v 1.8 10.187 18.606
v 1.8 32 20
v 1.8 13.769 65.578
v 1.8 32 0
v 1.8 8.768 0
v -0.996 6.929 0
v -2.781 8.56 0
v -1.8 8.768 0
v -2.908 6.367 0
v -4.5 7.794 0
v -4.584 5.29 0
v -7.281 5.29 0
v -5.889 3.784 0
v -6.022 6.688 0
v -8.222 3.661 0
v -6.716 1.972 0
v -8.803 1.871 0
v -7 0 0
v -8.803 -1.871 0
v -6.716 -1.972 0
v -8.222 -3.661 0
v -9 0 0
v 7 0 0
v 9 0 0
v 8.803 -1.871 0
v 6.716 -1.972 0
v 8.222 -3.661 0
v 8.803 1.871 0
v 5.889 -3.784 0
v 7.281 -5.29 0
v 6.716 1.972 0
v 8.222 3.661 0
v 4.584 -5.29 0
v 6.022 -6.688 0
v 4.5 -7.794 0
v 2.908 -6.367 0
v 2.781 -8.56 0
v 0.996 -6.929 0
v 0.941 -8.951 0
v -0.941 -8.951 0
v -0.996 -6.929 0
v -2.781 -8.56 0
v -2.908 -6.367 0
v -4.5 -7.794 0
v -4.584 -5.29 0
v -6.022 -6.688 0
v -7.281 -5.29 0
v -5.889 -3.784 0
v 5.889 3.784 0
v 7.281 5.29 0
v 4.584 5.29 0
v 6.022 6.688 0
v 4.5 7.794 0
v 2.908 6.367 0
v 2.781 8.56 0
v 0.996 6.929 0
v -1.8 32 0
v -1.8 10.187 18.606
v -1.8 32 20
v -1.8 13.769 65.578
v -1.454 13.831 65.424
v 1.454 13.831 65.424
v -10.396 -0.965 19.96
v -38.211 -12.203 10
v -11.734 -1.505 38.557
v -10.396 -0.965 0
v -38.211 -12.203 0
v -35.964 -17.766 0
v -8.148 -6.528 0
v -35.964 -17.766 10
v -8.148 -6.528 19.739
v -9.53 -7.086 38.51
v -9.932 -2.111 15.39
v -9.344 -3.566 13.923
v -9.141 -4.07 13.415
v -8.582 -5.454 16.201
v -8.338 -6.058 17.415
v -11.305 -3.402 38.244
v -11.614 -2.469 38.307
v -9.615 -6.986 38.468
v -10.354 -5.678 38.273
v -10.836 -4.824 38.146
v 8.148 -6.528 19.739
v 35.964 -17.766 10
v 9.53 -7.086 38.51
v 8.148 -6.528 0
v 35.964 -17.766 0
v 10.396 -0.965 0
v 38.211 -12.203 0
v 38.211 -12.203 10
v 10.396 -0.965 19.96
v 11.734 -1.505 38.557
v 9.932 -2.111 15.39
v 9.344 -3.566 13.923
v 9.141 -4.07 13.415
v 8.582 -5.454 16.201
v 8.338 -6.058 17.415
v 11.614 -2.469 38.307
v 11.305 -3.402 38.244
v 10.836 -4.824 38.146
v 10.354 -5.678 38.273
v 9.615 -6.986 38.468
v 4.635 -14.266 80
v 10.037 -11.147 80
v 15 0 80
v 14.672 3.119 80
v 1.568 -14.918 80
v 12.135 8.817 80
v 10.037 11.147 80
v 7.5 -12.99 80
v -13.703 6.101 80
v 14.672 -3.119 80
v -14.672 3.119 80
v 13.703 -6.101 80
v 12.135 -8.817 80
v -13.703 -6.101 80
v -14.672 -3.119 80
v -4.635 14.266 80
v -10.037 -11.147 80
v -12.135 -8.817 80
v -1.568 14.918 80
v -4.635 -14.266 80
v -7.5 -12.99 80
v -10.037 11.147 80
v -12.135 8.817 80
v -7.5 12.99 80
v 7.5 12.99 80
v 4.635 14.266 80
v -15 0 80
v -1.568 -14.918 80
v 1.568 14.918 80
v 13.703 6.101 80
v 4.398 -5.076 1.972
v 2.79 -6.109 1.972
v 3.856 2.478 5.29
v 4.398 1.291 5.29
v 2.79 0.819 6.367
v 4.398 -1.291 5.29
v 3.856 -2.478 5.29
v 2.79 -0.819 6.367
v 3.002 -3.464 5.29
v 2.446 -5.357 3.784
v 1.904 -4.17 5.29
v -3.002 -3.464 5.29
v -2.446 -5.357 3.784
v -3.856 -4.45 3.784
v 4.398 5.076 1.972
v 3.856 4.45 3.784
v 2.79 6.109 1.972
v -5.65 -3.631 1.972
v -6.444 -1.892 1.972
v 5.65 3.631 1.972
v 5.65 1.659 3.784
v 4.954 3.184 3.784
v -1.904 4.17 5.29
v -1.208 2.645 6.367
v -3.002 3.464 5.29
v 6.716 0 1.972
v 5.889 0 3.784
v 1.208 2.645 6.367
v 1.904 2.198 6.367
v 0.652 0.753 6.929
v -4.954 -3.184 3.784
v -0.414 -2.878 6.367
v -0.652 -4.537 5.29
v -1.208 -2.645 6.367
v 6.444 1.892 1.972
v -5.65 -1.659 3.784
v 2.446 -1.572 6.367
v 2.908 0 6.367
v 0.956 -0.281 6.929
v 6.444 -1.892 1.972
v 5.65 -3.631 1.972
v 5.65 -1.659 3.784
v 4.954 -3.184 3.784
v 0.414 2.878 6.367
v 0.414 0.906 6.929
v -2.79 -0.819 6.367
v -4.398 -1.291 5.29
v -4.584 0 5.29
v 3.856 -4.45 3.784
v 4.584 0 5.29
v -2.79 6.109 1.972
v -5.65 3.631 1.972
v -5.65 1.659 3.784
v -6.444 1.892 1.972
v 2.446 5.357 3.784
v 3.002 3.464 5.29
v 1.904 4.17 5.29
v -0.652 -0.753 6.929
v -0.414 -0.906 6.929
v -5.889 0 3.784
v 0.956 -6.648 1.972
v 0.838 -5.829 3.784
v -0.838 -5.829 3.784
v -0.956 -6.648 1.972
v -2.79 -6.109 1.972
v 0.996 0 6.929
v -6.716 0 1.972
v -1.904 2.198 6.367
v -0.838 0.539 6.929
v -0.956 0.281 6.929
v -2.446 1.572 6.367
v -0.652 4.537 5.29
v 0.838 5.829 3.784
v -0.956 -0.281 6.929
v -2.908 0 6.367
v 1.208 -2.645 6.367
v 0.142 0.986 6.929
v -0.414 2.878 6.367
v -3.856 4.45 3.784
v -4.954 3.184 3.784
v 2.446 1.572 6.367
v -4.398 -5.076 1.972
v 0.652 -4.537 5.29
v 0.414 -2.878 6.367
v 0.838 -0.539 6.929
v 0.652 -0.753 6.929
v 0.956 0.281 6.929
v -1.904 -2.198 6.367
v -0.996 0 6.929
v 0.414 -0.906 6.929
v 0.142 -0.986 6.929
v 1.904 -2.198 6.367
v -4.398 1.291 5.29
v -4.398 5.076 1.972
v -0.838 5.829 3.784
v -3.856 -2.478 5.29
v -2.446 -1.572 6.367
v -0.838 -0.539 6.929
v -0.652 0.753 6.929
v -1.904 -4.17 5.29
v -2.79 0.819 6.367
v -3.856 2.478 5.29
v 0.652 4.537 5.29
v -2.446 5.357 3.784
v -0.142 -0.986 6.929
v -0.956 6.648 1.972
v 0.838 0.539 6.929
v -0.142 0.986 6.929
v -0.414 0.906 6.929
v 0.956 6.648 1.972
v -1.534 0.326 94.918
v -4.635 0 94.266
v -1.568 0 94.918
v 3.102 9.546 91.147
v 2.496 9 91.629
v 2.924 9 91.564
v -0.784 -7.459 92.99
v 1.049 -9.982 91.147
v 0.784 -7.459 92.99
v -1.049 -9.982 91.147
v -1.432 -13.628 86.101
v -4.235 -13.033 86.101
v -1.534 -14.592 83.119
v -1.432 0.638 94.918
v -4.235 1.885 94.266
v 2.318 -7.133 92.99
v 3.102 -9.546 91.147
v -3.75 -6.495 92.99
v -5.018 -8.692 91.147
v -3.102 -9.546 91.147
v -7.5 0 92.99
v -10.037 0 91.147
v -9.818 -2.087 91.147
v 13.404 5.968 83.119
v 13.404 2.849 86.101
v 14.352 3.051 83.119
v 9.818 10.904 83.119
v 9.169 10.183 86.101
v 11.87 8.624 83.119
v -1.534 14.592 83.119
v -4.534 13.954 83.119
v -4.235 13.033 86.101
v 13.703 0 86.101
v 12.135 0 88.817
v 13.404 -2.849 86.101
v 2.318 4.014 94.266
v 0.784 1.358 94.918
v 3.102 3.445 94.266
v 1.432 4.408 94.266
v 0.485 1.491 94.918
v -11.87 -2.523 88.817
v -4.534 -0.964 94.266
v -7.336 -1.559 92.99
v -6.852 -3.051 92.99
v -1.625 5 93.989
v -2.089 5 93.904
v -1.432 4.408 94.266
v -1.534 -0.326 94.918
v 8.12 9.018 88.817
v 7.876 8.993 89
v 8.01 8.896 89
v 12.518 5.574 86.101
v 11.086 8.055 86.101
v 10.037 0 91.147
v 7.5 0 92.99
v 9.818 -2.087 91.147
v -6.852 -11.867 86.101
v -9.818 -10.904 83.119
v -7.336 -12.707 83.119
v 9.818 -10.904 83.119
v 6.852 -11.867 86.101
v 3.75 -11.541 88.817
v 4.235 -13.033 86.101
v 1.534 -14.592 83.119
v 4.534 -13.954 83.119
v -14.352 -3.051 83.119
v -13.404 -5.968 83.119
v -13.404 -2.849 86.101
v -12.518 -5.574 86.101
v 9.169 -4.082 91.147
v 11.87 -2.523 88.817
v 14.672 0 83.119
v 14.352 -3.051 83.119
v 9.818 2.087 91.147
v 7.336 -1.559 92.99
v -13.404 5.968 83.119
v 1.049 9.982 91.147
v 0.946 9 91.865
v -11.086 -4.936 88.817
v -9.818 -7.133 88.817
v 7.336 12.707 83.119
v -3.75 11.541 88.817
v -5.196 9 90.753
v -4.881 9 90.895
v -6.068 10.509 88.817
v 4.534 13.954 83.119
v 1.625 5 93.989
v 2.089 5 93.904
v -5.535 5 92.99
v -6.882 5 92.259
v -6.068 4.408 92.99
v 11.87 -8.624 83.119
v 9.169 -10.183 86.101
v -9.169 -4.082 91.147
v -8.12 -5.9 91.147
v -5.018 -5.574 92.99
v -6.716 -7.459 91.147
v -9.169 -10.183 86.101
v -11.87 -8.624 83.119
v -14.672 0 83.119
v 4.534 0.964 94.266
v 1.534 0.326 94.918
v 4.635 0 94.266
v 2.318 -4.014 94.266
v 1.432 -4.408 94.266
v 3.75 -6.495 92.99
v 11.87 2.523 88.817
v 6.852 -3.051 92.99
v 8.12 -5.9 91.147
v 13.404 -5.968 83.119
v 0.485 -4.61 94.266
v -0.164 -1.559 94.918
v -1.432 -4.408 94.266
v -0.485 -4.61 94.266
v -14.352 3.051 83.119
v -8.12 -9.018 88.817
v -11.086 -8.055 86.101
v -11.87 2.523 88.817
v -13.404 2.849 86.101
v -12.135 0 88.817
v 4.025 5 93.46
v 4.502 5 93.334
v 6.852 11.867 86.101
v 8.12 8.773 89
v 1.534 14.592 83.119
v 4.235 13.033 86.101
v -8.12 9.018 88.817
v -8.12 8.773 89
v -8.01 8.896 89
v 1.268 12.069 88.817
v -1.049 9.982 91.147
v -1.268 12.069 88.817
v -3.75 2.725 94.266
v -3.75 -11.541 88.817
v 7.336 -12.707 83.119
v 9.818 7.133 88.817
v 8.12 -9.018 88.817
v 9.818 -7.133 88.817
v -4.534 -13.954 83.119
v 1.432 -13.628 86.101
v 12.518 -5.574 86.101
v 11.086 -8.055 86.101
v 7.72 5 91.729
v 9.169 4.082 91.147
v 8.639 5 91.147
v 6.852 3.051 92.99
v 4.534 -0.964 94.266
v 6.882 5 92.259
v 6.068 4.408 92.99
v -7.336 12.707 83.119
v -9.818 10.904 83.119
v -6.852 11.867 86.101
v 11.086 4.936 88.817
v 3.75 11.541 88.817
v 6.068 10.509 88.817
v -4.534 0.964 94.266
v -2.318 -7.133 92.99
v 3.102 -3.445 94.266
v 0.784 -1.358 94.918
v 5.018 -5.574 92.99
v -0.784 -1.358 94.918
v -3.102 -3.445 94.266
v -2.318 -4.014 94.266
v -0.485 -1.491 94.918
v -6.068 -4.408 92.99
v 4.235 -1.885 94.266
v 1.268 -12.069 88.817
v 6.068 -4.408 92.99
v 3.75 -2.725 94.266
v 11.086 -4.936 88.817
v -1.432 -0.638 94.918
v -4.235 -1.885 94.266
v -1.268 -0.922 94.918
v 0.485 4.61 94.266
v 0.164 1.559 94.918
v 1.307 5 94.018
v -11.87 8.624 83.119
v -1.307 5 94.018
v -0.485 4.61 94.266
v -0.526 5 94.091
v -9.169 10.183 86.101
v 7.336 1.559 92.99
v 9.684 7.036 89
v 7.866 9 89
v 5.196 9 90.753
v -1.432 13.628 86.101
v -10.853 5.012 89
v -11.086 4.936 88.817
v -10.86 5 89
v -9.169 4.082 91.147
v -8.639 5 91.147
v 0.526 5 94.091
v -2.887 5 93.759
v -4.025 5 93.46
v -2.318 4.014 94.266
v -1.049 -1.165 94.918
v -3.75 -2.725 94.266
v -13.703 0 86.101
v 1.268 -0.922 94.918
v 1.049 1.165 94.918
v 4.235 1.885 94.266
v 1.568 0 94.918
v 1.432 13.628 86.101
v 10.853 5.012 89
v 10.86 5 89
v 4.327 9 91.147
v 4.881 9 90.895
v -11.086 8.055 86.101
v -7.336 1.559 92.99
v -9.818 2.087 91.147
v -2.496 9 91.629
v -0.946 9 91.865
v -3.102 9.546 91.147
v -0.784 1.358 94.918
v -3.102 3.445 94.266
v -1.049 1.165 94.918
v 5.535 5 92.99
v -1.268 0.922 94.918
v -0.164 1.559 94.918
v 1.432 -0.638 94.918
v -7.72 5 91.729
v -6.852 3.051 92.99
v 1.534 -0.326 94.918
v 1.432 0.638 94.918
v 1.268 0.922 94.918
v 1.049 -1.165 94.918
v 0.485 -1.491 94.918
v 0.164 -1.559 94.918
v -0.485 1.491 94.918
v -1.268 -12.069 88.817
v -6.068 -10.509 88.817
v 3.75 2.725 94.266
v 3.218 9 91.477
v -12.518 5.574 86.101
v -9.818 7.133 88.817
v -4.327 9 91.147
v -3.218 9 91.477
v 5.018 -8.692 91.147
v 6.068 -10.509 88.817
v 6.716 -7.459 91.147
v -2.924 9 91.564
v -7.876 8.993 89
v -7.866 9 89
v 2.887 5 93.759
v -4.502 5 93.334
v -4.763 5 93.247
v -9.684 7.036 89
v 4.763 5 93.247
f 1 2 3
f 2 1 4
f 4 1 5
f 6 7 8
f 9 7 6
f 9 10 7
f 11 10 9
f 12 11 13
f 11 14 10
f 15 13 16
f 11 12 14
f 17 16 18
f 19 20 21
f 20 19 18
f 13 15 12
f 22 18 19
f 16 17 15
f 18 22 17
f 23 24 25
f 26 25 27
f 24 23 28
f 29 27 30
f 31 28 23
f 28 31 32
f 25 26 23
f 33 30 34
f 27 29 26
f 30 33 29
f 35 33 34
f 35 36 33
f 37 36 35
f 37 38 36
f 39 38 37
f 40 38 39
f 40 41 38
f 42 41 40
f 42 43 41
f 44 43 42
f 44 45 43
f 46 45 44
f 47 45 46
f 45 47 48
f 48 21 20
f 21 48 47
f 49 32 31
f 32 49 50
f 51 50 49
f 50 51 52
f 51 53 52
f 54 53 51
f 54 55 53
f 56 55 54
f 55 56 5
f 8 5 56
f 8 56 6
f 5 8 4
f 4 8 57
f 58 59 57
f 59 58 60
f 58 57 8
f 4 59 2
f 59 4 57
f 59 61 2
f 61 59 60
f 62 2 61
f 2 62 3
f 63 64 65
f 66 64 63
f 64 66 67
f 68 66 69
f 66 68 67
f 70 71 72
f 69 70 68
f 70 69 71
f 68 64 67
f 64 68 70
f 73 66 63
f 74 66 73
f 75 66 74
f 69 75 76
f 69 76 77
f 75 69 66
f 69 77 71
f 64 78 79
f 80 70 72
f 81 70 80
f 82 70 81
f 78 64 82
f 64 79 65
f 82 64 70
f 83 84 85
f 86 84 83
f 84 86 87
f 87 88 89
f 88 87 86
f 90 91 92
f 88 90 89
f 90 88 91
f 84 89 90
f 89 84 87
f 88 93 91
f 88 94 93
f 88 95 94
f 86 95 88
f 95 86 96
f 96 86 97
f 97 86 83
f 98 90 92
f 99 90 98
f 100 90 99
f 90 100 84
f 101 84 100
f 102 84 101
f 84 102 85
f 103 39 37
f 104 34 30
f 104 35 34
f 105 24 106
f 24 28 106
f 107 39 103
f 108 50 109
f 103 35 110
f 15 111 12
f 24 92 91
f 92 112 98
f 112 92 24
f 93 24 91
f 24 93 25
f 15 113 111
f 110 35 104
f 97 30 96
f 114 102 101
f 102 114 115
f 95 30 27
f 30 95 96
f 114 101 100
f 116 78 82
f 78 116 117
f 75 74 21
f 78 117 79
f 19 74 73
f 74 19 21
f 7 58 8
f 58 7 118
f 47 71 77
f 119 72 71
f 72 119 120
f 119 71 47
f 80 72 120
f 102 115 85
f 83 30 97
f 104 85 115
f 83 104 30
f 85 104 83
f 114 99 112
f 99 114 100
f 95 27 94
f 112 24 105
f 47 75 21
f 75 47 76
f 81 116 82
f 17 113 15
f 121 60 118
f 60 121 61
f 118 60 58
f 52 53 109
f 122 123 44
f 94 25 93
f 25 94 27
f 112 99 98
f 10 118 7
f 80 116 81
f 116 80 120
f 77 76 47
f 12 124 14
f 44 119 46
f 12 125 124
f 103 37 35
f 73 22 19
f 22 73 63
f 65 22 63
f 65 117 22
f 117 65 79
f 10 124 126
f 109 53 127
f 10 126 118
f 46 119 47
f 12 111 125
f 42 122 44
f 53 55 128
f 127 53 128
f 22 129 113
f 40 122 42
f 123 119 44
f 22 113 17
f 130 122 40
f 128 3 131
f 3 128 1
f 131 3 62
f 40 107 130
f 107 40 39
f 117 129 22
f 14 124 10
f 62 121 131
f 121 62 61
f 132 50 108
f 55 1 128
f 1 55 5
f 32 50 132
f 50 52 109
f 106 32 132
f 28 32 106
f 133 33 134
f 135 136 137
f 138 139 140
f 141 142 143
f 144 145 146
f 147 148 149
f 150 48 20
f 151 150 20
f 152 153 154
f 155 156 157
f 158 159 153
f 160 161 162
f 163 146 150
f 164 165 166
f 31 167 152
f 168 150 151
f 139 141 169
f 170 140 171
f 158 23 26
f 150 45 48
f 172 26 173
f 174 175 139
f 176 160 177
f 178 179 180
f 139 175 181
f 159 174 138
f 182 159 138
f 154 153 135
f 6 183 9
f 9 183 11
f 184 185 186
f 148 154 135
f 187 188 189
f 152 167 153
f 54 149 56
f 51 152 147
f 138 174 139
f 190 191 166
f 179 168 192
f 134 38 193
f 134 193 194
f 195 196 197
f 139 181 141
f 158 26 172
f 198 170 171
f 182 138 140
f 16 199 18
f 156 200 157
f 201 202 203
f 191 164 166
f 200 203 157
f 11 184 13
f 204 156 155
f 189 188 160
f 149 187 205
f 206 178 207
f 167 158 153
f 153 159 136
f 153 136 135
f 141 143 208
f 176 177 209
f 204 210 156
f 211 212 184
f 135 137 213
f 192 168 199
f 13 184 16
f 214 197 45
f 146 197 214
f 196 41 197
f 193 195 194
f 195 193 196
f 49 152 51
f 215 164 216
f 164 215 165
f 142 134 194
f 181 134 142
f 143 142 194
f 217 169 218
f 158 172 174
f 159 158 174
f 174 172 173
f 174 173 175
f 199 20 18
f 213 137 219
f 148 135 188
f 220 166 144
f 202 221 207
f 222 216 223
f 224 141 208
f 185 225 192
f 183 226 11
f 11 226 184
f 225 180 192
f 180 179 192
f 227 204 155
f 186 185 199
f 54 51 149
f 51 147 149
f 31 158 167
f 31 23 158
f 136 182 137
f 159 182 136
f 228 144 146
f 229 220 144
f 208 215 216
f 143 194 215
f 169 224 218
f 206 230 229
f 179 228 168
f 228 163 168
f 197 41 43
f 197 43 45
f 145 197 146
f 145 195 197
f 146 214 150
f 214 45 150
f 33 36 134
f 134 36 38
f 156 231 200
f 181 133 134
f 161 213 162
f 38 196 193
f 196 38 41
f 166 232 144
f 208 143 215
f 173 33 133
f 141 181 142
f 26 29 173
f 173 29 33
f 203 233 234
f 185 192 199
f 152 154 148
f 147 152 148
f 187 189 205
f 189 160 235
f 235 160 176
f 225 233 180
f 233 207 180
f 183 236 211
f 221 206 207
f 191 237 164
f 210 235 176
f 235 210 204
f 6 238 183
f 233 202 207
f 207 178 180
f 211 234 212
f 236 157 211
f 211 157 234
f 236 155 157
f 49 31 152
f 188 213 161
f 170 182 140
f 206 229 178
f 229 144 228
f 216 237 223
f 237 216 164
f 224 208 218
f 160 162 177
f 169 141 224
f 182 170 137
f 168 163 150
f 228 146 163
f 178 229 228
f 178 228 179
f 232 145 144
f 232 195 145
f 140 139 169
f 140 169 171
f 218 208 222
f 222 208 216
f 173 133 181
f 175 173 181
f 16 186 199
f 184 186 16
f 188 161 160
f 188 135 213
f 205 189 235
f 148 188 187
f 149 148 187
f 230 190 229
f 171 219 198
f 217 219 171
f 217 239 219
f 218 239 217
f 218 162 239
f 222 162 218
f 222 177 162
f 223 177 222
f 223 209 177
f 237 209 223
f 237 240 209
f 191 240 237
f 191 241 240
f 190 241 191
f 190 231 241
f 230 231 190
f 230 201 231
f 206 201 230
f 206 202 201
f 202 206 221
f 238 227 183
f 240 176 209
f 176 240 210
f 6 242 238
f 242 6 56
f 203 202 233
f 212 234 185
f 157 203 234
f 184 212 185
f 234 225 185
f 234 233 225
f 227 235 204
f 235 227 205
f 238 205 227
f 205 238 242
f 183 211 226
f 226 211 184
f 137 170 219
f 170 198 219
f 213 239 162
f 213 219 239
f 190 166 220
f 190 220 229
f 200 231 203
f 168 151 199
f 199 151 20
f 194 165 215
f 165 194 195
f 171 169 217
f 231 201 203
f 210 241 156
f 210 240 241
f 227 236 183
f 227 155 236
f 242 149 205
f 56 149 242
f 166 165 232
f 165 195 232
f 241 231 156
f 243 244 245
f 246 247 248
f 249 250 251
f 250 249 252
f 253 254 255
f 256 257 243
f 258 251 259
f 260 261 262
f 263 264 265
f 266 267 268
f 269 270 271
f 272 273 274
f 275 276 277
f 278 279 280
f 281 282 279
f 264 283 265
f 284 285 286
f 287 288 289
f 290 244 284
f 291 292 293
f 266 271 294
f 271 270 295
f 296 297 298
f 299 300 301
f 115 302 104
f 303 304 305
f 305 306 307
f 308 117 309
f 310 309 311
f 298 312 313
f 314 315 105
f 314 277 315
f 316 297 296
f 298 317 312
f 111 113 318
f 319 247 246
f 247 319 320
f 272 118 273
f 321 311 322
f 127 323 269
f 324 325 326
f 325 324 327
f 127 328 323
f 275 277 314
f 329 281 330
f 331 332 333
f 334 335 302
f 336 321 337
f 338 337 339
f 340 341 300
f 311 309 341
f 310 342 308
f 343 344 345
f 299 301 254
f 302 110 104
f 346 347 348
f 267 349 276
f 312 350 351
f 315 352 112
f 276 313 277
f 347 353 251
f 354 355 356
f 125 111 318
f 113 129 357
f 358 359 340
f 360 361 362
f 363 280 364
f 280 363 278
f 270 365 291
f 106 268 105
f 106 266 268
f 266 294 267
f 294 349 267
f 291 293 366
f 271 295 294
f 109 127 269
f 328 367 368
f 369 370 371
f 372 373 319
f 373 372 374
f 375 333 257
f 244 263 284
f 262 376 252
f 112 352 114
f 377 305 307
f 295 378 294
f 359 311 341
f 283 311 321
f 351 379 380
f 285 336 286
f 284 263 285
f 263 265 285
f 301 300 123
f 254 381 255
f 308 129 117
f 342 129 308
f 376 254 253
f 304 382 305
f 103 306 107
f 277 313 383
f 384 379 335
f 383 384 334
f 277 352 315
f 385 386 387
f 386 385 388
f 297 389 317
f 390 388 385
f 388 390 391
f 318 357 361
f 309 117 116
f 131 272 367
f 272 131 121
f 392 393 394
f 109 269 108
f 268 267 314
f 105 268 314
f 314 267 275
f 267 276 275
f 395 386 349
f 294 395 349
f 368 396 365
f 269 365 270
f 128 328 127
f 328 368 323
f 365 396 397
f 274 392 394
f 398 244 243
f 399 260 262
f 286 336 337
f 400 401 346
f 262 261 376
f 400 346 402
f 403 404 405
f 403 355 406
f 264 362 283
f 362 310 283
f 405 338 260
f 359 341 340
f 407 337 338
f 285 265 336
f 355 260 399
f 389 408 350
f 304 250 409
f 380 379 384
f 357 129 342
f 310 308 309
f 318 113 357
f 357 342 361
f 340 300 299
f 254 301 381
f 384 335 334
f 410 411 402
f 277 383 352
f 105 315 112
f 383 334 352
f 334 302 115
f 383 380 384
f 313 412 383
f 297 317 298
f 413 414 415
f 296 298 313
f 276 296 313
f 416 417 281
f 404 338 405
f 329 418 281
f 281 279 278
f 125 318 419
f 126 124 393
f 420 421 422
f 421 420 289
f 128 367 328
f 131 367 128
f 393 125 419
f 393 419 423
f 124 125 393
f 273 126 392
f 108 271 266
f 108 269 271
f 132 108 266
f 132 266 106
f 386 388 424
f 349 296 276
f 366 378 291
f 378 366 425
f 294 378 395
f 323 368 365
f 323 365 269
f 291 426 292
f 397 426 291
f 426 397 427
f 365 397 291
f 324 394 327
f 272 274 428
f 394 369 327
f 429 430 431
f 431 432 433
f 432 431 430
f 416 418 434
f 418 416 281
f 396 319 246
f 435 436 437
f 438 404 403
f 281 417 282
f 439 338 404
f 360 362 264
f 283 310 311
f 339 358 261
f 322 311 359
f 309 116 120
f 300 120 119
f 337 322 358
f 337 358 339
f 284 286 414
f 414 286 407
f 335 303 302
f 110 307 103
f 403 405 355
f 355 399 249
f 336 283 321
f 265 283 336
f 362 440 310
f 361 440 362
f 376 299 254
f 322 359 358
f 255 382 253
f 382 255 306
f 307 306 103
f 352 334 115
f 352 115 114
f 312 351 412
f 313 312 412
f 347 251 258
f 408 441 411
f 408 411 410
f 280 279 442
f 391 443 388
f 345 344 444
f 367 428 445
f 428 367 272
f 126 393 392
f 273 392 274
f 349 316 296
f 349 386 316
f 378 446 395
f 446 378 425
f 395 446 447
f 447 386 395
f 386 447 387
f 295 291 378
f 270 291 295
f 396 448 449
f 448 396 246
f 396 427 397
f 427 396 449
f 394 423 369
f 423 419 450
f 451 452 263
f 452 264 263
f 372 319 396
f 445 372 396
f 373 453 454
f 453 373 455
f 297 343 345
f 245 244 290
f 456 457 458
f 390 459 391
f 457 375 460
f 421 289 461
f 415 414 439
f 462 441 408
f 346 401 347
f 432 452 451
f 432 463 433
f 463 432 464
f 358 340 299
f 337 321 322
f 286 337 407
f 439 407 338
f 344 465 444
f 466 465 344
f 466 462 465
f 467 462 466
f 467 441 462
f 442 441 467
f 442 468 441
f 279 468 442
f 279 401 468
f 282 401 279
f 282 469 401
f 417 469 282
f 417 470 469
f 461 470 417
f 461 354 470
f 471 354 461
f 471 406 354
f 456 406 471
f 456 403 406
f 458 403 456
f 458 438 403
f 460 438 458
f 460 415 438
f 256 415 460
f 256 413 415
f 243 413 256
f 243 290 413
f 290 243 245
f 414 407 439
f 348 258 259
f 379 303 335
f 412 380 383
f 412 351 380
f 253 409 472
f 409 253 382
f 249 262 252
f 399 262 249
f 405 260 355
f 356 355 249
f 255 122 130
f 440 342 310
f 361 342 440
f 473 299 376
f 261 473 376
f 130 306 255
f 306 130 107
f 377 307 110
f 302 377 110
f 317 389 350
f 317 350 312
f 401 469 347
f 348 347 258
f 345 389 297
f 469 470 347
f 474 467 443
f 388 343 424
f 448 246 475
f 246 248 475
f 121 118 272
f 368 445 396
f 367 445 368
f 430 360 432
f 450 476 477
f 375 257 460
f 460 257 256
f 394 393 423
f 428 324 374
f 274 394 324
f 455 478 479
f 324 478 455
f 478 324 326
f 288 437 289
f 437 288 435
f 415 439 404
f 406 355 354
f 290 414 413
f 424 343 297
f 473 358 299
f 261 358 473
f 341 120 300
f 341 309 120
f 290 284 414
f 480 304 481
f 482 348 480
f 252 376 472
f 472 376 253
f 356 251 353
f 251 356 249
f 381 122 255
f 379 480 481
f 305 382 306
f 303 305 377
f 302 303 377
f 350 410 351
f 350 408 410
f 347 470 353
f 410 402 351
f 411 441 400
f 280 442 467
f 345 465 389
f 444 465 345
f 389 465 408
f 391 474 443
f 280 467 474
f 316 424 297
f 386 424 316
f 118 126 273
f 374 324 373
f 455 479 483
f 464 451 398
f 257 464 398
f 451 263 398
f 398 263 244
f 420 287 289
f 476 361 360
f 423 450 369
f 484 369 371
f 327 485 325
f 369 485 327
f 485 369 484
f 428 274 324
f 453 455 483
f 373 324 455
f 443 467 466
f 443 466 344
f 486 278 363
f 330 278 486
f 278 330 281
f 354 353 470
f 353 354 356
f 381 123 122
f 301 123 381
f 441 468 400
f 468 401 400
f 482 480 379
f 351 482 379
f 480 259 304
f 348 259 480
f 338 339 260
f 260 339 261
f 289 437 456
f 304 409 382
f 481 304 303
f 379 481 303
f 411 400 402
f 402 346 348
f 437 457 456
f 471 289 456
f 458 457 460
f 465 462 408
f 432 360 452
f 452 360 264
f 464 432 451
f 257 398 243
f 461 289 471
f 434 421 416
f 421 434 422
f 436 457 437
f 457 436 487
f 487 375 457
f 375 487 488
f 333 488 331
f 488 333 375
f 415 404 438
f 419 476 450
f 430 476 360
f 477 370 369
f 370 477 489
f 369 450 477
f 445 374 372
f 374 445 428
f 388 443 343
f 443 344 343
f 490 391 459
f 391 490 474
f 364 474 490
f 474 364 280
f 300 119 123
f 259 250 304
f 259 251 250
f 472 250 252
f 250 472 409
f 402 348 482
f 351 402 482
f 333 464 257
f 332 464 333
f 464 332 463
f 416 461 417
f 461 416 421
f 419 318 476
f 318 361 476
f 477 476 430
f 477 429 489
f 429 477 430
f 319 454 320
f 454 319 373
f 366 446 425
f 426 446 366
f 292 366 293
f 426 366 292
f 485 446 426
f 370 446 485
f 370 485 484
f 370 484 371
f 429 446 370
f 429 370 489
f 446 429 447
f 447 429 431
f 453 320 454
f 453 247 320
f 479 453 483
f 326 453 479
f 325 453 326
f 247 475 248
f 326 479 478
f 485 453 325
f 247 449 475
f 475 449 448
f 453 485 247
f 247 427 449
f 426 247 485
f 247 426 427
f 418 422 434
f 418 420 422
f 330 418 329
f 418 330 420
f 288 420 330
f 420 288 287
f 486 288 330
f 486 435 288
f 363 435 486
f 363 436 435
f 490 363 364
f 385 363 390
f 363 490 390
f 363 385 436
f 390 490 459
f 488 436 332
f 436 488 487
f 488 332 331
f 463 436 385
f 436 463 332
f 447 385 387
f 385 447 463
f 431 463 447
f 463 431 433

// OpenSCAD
module fin() {
    translate([-3,10,0])
    difference() {
        cube([6,30,40]);
        translate([-1,0,40]) rotate([-45,0,0]) cube([8,60,30]);
    }
}

module body() {
    body_height = 80;
    union() {
        difference() {
            translate([0,0,body_height/2])
                cylinder(h = body_height, r1 = 9, r2 = 15, center = true);
            sphere(7, center=true);
        }
        // Nose
        difference() {
            translate([0,0,body_height]) sphere(15);
            translate([0,7,body_height + 13]) cube([25,4,8], center = true);
        }
    }
}

module ship(){
    scale([0.6,0.8,2]) fin();
    rotate([0,0,112]) fin();
    rotate([0,0,-112]) fin();
    body();
}

ship();
